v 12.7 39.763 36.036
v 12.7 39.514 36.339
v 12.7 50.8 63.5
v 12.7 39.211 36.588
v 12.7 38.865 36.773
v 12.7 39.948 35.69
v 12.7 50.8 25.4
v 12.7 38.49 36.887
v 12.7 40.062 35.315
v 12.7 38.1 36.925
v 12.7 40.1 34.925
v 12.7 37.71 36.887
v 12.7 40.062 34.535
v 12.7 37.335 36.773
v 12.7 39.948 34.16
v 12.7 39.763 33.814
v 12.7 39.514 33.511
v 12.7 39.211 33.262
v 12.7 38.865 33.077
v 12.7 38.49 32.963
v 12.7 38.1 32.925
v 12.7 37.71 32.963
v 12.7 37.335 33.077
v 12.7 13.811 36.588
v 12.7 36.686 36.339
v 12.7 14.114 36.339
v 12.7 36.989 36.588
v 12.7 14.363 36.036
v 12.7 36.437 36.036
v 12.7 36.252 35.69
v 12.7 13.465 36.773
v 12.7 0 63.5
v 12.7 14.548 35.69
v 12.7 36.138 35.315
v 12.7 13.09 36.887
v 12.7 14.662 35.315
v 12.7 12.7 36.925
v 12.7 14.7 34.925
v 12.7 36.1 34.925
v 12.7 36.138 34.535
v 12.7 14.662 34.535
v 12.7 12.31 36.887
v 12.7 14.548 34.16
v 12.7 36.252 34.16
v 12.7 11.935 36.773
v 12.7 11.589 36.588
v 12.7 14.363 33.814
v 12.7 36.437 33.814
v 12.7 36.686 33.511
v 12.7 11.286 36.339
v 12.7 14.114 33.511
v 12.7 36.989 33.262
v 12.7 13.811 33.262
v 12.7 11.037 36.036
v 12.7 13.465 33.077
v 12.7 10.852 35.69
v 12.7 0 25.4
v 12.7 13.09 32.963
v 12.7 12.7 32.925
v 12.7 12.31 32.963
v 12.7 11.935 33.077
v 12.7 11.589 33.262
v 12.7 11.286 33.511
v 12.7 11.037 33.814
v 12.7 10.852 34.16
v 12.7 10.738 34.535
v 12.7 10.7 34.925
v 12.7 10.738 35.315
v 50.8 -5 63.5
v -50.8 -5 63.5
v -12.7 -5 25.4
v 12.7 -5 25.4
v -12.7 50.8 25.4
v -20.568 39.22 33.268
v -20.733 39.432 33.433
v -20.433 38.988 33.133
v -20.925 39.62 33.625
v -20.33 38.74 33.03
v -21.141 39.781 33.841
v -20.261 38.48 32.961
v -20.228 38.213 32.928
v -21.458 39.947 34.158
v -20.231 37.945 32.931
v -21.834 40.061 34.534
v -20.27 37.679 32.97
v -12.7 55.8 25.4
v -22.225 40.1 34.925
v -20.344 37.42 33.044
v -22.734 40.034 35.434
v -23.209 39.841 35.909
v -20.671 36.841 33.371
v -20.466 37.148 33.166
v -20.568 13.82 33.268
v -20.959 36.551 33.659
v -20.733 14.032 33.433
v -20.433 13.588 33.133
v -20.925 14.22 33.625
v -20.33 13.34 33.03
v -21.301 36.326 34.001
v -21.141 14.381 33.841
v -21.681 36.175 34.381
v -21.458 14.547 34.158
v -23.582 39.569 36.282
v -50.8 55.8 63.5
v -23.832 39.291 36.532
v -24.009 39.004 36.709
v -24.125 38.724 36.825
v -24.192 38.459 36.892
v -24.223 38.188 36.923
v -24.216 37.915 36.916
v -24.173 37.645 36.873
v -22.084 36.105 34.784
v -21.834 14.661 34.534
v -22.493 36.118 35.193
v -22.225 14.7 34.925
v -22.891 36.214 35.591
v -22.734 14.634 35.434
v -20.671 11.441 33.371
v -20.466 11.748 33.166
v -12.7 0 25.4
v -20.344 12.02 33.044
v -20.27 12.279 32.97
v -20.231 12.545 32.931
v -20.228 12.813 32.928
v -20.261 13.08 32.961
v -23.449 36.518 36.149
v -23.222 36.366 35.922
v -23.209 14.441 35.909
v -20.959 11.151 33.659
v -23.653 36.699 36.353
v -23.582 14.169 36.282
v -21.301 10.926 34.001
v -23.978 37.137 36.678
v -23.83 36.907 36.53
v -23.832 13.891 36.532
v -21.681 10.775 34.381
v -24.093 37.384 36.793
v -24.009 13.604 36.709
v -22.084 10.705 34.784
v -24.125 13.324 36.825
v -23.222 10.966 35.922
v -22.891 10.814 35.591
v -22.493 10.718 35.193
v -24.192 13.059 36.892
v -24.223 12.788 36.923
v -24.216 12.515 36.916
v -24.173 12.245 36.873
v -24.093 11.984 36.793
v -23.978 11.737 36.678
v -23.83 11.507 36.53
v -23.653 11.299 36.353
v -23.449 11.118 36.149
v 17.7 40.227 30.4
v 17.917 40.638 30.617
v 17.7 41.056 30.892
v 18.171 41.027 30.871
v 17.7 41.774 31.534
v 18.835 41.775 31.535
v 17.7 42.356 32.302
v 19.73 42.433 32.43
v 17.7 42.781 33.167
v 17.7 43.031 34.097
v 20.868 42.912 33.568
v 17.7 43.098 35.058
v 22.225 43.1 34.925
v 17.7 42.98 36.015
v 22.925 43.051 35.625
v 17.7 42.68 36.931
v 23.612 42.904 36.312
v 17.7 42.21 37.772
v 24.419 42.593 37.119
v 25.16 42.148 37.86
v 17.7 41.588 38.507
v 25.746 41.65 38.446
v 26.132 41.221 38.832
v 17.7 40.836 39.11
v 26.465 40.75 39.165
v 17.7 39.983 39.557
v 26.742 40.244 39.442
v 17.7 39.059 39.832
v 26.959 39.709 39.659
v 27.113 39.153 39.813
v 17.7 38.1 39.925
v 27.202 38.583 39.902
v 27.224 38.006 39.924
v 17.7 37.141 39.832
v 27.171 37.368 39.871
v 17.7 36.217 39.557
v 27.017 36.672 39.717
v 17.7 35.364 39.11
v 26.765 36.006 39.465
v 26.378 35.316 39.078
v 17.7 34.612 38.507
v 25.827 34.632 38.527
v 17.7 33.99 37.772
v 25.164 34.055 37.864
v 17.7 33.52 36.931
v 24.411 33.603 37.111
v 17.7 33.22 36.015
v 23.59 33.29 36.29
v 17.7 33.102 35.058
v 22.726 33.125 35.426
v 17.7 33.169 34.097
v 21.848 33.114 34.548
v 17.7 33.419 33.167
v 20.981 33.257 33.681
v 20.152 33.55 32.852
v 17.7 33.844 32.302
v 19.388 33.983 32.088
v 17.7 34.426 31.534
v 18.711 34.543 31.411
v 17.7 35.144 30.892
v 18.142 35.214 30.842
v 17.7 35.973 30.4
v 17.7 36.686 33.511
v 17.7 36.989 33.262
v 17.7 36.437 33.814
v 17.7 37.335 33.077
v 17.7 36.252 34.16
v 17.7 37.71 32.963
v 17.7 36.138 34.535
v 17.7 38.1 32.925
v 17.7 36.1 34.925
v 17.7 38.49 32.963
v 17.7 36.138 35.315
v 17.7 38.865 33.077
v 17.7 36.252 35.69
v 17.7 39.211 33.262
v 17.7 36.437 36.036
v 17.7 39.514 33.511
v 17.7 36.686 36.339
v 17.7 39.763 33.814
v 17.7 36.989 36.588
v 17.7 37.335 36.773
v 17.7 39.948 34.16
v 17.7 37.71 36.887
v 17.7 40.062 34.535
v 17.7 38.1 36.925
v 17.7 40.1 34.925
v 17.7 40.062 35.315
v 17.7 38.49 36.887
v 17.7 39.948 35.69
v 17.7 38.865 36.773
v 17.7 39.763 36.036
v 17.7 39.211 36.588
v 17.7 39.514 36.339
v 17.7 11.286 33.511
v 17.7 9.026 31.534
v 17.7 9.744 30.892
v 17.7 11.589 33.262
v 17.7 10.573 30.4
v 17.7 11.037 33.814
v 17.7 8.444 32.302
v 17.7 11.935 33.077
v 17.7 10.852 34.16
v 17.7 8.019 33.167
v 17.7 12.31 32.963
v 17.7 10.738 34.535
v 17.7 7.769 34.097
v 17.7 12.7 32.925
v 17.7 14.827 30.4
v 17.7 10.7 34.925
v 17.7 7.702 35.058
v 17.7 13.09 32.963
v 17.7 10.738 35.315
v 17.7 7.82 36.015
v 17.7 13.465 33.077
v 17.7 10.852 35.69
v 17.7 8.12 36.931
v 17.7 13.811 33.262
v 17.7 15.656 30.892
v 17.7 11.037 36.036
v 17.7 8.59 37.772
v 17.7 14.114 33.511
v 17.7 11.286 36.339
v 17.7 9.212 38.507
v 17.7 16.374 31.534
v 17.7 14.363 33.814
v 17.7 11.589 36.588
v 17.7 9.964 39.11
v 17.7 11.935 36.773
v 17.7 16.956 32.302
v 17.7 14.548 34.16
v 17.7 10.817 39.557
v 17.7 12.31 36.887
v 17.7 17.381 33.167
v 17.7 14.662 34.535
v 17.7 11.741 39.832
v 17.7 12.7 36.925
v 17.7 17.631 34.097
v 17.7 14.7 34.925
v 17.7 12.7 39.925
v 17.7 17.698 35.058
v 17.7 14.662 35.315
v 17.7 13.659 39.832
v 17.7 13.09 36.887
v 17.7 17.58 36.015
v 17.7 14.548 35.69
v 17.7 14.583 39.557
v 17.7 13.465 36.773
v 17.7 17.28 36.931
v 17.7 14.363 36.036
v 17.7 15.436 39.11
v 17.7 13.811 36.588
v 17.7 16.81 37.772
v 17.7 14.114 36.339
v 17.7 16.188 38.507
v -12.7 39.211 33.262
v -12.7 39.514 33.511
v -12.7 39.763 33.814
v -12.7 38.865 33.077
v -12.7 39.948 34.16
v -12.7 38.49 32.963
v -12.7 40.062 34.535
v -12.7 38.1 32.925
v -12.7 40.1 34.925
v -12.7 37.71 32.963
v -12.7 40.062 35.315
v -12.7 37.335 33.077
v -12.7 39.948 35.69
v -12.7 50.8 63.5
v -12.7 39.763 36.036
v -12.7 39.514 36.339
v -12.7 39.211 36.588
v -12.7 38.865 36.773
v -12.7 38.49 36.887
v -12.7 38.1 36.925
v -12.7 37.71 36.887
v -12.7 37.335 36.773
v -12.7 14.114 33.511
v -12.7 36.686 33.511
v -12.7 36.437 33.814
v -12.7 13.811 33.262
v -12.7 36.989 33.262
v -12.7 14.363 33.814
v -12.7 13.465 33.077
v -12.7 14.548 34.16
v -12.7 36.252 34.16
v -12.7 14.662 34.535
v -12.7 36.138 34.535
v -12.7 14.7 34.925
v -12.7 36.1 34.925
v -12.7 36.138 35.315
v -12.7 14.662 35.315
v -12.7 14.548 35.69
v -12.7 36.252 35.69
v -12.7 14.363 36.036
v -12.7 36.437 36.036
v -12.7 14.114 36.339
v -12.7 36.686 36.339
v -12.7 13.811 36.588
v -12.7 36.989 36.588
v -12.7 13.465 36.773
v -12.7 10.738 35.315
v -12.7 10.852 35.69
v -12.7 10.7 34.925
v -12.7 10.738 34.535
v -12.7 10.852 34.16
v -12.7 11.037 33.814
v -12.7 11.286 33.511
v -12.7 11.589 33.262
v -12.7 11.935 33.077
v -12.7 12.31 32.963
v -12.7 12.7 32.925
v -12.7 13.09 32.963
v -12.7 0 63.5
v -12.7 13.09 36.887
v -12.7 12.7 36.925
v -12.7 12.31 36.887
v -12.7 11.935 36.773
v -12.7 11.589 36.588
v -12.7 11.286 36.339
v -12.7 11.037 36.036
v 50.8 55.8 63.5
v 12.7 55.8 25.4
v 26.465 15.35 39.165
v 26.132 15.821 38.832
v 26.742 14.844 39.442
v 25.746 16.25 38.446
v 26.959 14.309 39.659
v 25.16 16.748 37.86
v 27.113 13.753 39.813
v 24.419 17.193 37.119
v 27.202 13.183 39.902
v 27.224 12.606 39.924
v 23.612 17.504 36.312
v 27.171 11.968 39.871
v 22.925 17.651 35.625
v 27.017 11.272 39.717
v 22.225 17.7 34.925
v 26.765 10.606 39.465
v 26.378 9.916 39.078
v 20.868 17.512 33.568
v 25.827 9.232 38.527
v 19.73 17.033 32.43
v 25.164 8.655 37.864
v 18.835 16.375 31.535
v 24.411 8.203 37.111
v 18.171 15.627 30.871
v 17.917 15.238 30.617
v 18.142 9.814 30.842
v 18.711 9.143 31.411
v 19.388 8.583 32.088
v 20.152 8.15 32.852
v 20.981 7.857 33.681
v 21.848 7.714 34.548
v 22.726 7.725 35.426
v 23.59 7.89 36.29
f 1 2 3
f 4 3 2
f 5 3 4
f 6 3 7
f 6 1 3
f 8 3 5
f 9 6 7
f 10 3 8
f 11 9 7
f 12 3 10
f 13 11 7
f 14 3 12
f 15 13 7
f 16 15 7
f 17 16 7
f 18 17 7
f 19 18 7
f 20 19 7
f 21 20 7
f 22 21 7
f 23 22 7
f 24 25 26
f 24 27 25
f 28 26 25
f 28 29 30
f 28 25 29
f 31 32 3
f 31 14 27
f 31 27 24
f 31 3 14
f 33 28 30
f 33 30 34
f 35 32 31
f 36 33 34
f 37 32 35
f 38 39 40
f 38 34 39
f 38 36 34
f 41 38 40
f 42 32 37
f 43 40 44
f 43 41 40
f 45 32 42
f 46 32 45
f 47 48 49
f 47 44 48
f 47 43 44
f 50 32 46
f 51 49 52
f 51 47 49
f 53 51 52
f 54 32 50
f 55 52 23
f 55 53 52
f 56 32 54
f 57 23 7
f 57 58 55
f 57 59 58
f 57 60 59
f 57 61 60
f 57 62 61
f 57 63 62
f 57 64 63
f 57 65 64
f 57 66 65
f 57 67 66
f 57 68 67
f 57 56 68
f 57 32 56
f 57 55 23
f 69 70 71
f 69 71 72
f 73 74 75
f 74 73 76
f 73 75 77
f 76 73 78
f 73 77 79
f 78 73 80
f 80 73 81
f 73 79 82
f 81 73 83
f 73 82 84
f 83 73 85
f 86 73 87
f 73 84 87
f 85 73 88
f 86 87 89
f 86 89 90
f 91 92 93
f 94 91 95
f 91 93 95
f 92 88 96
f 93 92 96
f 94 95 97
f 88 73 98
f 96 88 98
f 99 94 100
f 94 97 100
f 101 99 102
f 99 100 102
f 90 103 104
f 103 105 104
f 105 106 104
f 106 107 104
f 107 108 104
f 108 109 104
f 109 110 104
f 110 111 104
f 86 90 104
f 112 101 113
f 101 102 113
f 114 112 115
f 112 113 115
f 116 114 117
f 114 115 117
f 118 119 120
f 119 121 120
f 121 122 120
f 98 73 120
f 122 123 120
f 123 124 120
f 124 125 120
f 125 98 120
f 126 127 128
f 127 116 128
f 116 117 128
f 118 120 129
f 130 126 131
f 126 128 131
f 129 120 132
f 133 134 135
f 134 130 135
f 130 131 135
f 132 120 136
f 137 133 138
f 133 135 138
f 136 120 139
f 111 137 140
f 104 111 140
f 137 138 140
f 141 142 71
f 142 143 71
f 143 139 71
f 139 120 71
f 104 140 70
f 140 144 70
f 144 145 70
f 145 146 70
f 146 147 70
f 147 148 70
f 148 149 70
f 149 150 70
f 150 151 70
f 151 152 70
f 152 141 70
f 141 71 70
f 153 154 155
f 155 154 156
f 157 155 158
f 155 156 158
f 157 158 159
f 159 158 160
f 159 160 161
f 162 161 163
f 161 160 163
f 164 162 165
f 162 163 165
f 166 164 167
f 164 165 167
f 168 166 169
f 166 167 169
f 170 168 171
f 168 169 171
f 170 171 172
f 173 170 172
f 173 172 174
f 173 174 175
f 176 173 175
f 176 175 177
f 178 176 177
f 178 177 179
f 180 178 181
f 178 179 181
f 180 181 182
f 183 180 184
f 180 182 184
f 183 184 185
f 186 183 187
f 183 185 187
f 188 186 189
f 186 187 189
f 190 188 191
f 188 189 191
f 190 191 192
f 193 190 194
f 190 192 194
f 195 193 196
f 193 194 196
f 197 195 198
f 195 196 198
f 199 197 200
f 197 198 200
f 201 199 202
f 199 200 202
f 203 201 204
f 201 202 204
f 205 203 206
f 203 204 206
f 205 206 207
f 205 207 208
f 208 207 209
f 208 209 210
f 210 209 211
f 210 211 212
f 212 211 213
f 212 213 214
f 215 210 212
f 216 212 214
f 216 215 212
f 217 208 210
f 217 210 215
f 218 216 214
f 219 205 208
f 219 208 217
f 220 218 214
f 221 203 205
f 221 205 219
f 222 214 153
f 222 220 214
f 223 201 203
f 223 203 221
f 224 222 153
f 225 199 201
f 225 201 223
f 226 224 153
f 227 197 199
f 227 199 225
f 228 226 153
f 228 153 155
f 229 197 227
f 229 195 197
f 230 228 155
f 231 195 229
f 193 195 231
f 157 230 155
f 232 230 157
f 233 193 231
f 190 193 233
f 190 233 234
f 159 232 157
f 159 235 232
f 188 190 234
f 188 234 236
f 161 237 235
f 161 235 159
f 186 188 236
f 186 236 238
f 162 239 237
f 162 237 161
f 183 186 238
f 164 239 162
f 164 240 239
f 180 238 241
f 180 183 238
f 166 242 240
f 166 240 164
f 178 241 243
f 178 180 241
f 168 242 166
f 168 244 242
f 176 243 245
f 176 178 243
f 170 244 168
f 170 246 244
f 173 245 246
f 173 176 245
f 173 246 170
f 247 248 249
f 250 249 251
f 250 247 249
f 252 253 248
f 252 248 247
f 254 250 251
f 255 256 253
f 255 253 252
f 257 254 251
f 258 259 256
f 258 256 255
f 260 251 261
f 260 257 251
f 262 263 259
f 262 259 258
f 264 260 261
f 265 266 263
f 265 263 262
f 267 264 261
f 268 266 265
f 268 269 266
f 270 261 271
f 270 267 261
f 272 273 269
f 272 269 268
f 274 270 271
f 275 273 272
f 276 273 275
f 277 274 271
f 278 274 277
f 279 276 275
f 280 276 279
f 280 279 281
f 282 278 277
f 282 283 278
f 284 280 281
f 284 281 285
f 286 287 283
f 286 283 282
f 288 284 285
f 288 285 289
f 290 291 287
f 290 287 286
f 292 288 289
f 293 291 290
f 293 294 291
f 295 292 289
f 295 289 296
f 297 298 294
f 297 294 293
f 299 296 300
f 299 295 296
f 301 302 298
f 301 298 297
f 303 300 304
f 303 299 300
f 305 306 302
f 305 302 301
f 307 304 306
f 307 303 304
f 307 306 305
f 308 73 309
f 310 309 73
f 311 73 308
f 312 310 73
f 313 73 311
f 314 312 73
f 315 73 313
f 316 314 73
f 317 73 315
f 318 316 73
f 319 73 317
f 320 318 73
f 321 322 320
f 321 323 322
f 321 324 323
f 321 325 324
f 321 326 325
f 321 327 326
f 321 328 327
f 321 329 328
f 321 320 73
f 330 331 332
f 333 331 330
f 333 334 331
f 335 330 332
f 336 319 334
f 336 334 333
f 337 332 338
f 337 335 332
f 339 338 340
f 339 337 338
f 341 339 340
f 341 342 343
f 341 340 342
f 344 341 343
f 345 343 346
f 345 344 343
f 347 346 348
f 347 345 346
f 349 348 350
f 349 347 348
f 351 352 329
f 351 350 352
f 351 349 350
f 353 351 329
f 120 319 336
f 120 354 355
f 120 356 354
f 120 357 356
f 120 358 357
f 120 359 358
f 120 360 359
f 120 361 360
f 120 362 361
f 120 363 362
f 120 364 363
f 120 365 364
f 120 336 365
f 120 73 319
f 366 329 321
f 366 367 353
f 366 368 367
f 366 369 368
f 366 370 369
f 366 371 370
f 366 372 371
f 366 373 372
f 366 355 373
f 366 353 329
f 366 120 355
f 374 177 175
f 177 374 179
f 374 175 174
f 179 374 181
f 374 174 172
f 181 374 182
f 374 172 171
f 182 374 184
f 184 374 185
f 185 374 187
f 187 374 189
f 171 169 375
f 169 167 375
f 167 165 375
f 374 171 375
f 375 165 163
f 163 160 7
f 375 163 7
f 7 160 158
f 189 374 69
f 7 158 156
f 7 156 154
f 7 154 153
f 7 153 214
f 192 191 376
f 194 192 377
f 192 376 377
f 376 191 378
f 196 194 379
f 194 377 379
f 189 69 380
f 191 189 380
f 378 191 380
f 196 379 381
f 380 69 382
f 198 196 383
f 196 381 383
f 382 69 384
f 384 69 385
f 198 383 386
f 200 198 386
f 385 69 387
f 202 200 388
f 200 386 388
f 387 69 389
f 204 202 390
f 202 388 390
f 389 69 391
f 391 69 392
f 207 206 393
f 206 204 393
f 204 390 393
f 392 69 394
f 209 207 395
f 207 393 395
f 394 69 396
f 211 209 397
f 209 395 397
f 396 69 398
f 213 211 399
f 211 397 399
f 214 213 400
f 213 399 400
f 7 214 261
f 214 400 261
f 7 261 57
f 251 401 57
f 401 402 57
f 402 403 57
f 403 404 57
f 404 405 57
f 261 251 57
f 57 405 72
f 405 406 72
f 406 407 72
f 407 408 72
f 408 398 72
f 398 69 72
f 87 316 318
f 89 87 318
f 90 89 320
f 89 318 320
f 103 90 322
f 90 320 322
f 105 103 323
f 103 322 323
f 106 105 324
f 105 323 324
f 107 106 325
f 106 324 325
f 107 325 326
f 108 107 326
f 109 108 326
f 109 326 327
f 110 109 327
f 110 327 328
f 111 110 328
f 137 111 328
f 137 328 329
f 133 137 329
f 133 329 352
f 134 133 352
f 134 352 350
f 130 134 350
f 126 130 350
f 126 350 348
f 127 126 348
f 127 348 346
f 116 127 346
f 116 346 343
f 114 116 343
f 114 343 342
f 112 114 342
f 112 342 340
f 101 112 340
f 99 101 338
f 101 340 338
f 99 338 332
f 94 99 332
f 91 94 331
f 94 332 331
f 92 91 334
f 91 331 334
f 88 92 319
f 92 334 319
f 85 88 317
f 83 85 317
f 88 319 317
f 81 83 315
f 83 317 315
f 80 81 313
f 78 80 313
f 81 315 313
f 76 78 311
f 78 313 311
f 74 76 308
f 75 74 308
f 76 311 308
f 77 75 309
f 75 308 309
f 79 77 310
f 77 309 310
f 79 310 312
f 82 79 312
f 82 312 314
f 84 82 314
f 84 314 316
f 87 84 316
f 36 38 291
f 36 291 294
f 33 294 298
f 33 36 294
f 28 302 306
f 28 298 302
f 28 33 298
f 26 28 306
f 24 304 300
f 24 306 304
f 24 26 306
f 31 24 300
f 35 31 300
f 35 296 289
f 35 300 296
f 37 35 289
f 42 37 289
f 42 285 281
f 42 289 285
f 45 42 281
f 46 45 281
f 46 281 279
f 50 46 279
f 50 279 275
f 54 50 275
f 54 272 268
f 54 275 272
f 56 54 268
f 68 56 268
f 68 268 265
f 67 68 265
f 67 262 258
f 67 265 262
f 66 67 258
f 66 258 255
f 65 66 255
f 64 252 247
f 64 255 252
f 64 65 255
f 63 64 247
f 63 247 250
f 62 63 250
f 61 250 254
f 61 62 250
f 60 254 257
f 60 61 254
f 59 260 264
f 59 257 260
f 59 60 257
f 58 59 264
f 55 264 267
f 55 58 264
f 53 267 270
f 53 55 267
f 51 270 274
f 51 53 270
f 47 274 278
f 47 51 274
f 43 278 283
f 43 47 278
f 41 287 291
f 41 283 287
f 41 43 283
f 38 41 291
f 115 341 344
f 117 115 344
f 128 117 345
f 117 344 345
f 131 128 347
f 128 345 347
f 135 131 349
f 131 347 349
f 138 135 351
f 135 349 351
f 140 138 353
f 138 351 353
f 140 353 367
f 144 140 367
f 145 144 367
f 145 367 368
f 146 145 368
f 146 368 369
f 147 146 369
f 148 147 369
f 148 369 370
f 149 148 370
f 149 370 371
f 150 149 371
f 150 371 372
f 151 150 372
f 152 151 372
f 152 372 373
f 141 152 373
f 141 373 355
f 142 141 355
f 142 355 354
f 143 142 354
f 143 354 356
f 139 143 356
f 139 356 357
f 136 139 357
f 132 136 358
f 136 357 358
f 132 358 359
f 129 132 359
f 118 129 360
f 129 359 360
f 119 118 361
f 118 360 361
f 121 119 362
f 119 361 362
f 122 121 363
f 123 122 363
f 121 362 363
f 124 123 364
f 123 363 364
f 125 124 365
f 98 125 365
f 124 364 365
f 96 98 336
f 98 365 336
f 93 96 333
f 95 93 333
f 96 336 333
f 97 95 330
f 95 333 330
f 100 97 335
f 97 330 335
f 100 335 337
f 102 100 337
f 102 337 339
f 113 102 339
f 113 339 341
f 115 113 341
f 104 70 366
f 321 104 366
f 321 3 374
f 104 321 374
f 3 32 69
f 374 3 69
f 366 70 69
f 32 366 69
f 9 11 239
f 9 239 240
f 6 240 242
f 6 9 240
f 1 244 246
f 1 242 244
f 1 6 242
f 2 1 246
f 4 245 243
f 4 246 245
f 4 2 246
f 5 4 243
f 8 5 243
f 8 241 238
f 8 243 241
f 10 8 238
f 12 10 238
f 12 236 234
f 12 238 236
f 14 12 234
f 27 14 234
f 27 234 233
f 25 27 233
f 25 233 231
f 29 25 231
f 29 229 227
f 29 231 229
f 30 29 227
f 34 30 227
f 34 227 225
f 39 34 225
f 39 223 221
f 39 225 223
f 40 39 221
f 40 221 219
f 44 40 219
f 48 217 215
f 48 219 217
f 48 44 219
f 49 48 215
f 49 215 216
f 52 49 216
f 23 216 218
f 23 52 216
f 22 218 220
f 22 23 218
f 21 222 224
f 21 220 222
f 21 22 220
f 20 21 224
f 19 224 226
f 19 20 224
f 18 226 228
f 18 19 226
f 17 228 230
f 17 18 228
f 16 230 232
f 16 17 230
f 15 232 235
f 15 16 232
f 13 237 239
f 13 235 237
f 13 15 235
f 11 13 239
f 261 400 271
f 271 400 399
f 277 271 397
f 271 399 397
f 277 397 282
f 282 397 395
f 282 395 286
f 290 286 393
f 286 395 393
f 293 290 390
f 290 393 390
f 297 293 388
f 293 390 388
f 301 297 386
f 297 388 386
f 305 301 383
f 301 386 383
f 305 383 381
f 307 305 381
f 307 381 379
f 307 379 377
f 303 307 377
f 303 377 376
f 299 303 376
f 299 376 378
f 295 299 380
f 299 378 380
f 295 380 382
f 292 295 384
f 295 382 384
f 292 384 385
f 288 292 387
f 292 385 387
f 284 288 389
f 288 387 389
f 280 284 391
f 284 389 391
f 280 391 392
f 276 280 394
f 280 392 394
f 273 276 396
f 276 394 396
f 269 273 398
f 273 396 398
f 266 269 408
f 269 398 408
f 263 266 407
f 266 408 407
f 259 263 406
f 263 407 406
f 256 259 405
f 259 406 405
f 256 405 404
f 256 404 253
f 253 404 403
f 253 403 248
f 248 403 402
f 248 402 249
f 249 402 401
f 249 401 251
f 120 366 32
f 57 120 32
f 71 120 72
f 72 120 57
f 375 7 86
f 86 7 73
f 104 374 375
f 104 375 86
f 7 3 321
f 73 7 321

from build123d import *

# Parameters (mm, degrees)
F0_W          = 25.4
F0_H          = 38.1
F1_DEPTH      = 5
F2_DEPTH      = 50.8
F3_W          = 25.4
F3_H          = 38.1
F4_DEPTH      = 5
F5_R          = 2
F6_DEPTH      = 50.801
F6_DEPTH_BACK = 50.801
F8_R          = 5
F9_DEPTH      = 33.1


with BuildPart() as f1:
    # F0 (on Front) → F1 (new body)
    with BuildSketch(Plane.XZ):
        Polygon((-12.7, 63.5), (-50.8, 63.5), (-12.7, 25.4), align=None)
        with Locations((0, 44.45)):
            Rectangle(F0_W, F0_H)
        Polygon((12.7, 63.5), (12.7, 25.4), (50.8, 63.5), align=None)
    extrude(amount=F1_DEPTH)

    # F0 (on Front) → F2 (join)
    with BuildSketch(Plane.XZ):
        Polygon((12.7, 63.5), (12.7, 25.4), (50.8, 63.5), align=None)
        Polygon((-12.7, 63.5), (-50.8, 63.5), (-12.7, 25.4), align=None)
    extrude(amount=-F2_DEPTH)

    # F3 (on face) → F4 (join)
    with BuildSketch(Plane(origin=(0, 50.8, 0), x_dir=(-1, 0, 0), z_dir=(0, 1, 0))):
        Polygon((50.8, 63.5), (12.7, 63.5), (12.7, 25.4), align=None)
        with Locations((0, 44.45)):
            Rectangle(F3_W, F3_H)
        Polygon((-12.7, 25.4), (-12.7, 63.5), (-50.8, 63.5), align=None)
    extrude(amount=F4_DEPTH)

    # F5 (on Right) → F6 (cut, two sides)
    with BuildSketch(Plane.YZ) as f6_sk:
        with Locations((38.1, 34.925)):
            Circle(F5_R)
        with Locations((12.7, 34.925)):
            Circle(F5_R)
    extrude(amount=-F6_DEPTH, mode=Mode.SUBTRACT)
    extrude(f6_sk.sketch, amount=F6_DEPTH_BACK, mode=Mode.SUBTRACT)

    # F8 (on offset) → F9 (cut, through all)
    with BuildSketch(Plane.YZ.offset(50.8)):
        with Locations((38.1, 34.925)):
            Circle(F8_R)
        with Locations((12.7, 34.925)):
            Circle(F8_R)
    extrude(amount=-F9_DEPTH, mode=Mode.SUBTRACT)


solid = f1.part
